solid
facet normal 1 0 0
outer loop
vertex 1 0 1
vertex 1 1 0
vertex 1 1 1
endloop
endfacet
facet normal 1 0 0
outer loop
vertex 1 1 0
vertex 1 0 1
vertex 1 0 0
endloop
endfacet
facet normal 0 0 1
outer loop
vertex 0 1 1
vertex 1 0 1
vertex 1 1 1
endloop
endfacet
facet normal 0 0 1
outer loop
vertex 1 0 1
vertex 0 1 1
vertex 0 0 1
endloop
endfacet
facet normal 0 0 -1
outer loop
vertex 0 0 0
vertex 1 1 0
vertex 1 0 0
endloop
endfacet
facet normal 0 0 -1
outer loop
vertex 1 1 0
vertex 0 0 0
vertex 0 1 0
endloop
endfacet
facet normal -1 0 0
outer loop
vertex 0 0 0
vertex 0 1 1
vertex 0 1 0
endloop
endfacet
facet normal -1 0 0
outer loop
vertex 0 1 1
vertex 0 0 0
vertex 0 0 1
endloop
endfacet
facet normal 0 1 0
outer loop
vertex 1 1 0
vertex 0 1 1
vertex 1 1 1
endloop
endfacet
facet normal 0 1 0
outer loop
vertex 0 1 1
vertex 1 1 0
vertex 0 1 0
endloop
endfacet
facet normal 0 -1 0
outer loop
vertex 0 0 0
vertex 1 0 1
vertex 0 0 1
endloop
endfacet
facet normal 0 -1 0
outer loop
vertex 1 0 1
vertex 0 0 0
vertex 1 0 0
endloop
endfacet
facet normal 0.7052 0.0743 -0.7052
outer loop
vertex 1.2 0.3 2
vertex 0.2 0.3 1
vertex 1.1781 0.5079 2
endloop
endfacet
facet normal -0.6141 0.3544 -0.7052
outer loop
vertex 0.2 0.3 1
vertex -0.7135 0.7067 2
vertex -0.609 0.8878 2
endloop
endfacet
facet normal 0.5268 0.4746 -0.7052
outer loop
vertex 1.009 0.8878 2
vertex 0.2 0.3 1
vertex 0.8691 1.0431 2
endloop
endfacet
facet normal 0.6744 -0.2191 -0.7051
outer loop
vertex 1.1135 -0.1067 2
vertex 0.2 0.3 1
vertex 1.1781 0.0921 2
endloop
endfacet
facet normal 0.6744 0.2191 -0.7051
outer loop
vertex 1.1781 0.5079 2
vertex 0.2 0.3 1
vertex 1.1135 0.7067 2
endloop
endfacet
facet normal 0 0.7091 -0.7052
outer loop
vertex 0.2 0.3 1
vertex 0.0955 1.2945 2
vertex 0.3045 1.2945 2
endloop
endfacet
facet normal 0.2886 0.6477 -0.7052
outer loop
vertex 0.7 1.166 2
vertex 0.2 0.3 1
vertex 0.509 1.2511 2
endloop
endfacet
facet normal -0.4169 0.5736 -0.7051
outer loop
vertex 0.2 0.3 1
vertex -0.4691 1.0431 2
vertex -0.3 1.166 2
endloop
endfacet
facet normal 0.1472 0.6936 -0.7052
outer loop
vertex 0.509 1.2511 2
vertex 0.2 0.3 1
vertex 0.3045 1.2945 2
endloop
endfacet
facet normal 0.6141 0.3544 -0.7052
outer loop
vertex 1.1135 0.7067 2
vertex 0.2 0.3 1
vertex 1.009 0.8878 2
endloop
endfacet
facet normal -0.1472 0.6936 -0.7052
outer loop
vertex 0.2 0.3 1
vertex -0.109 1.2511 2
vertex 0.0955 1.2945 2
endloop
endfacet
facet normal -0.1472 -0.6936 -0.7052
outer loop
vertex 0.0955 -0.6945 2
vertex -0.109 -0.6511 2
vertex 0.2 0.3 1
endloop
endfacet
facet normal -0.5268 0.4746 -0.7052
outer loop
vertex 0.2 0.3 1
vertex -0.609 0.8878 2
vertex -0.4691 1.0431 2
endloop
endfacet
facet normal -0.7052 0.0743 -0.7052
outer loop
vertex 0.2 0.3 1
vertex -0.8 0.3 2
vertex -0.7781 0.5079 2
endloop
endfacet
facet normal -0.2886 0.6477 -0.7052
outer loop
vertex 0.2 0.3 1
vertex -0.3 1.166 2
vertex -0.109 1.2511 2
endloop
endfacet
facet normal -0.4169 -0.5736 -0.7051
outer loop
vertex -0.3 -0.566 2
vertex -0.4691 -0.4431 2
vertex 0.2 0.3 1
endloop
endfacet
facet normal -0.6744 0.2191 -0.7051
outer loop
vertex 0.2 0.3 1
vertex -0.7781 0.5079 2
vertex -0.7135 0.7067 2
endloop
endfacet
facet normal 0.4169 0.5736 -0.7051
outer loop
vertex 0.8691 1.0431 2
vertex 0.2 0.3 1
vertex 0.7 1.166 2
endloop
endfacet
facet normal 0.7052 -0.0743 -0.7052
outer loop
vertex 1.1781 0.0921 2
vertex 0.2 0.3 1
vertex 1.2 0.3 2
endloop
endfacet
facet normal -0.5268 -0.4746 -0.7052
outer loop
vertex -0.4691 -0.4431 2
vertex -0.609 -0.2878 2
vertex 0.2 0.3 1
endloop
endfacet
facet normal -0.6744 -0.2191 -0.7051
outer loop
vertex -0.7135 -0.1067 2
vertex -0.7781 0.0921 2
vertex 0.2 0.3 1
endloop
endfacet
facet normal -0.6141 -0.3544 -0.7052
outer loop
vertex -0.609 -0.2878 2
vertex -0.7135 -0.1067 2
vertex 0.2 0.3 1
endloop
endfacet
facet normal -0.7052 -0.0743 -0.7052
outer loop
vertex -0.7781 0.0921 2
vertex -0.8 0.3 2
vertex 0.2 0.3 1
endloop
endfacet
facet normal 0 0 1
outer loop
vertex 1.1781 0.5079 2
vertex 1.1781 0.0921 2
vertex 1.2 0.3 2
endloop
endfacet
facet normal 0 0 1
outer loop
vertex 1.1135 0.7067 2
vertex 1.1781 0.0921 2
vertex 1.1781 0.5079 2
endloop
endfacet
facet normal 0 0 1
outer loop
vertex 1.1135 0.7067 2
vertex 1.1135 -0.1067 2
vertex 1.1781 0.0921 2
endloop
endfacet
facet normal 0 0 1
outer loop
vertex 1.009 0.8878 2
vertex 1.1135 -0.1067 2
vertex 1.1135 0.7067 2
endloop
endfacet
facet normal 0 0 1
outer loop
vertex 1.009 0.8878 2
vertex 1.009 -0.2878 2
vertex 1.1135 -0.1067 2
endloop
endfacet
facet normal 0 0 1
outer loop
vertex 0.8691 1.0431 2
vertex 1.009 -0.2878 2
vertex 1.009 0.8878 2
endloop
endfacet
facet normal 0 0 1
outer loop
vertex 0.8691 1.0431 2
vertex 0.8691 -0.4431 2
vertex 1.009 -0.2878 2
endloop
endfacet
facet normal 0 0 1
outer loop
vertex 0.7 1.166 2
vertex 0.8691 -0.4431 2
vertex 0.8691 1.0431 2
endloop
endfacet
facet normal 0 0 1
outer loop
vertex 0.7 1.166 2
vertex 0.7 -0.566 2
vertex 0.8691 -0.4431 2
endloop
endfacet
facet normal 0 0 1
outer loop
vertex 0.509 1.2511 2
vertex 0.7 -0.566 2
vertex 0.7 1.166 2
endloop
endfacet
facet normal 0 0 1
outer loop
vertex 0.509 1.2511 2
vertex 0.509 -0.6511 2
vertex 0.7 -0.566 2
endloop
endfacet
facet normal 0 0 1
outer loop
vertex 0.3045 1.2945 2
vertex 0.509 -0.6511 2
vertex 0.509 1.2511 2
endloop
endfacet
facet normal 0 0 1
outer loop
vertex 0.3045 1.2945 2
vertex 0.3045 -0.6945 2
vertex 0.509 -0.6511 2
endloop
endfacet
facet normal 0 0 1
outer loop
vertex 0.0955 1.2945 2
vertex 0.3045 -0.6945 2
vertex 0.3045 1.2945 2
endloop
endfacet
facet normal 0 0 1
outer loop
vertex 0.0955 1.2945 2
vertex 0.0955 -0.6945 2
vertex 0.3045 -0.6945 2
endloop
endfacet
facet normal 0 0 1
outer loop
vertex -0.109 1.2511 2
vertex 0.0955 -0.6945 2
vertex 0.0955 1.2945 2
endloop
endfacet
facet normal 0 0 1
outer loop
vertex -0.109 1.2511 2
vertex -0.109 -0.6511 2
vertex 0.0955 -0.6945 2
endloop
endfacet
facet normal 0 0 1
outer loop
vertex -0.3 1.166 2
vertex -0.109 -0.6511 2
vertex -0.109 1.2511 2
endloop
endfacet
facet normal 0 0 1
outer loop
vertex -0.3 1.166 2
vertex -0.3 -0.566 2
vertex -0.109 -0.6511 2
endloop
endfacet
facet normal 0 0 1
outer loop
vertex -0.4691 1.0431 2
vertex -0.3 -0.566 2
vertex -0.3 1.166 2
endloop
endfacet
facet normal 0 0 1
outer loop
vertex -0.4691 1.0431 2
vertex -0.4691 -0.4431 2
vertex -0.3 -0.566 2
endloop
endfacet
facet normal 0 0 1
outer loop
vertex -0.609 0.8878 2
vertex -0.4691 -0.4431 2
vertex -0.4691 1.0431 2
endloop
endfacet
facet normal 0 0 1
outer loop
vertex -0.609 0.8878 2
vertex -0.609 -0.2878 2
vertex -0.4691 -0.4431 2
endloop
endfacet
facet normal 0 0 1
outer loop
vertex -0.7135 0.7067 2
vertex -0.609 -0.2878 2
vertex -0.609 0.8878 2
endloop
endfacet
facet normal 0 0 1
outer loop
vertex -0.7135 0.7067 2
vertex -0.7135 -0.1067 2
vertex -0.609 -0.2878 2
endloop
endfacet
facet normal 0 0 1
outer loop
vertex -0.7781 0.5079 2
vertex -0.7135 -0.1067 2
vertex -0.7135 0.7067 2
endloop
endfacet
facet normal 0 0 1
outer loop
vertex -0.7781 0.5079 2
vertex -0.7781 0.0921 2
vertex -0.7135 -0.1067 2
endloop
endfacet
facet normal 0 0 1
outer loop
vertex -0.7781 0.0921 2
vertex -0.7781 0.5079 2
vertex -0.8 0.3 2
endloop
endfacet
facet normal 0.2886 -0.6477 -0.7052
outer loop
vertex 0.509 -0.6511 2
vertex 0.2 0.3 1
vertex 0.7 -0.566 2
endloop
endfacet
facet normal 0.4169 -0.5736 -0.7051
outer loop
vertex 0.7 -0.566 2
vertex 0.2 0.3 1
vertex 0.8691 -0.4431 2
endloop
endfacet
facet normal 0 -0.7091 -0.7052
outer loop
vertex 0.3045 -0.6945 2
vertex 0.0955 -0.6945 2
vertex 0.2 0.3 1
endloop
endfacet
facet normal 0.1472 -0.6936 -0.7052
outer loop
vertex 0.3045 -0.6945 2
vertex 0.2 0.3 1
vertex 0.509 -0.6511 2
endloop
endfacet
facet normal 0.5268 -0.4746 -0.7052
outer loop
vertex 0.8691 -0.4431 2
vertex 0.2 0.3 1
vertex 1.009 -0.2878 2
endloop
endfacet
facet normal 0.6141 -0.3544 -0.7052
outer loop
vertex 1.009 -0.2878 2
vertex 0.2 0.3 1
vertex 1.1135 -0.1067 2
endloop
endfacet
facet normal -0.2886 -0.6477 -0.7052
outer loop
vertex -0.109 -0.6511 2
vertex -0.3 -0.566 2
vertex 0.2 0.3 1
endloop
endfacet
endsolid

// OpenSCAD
// Note: to see intersection vertex with compute_CSG,
// use simplify=false 
union() {
   cube();
   translate([0.2,0.3,1]) cylinder(r1=0,r2=1,$fn=30);
}
